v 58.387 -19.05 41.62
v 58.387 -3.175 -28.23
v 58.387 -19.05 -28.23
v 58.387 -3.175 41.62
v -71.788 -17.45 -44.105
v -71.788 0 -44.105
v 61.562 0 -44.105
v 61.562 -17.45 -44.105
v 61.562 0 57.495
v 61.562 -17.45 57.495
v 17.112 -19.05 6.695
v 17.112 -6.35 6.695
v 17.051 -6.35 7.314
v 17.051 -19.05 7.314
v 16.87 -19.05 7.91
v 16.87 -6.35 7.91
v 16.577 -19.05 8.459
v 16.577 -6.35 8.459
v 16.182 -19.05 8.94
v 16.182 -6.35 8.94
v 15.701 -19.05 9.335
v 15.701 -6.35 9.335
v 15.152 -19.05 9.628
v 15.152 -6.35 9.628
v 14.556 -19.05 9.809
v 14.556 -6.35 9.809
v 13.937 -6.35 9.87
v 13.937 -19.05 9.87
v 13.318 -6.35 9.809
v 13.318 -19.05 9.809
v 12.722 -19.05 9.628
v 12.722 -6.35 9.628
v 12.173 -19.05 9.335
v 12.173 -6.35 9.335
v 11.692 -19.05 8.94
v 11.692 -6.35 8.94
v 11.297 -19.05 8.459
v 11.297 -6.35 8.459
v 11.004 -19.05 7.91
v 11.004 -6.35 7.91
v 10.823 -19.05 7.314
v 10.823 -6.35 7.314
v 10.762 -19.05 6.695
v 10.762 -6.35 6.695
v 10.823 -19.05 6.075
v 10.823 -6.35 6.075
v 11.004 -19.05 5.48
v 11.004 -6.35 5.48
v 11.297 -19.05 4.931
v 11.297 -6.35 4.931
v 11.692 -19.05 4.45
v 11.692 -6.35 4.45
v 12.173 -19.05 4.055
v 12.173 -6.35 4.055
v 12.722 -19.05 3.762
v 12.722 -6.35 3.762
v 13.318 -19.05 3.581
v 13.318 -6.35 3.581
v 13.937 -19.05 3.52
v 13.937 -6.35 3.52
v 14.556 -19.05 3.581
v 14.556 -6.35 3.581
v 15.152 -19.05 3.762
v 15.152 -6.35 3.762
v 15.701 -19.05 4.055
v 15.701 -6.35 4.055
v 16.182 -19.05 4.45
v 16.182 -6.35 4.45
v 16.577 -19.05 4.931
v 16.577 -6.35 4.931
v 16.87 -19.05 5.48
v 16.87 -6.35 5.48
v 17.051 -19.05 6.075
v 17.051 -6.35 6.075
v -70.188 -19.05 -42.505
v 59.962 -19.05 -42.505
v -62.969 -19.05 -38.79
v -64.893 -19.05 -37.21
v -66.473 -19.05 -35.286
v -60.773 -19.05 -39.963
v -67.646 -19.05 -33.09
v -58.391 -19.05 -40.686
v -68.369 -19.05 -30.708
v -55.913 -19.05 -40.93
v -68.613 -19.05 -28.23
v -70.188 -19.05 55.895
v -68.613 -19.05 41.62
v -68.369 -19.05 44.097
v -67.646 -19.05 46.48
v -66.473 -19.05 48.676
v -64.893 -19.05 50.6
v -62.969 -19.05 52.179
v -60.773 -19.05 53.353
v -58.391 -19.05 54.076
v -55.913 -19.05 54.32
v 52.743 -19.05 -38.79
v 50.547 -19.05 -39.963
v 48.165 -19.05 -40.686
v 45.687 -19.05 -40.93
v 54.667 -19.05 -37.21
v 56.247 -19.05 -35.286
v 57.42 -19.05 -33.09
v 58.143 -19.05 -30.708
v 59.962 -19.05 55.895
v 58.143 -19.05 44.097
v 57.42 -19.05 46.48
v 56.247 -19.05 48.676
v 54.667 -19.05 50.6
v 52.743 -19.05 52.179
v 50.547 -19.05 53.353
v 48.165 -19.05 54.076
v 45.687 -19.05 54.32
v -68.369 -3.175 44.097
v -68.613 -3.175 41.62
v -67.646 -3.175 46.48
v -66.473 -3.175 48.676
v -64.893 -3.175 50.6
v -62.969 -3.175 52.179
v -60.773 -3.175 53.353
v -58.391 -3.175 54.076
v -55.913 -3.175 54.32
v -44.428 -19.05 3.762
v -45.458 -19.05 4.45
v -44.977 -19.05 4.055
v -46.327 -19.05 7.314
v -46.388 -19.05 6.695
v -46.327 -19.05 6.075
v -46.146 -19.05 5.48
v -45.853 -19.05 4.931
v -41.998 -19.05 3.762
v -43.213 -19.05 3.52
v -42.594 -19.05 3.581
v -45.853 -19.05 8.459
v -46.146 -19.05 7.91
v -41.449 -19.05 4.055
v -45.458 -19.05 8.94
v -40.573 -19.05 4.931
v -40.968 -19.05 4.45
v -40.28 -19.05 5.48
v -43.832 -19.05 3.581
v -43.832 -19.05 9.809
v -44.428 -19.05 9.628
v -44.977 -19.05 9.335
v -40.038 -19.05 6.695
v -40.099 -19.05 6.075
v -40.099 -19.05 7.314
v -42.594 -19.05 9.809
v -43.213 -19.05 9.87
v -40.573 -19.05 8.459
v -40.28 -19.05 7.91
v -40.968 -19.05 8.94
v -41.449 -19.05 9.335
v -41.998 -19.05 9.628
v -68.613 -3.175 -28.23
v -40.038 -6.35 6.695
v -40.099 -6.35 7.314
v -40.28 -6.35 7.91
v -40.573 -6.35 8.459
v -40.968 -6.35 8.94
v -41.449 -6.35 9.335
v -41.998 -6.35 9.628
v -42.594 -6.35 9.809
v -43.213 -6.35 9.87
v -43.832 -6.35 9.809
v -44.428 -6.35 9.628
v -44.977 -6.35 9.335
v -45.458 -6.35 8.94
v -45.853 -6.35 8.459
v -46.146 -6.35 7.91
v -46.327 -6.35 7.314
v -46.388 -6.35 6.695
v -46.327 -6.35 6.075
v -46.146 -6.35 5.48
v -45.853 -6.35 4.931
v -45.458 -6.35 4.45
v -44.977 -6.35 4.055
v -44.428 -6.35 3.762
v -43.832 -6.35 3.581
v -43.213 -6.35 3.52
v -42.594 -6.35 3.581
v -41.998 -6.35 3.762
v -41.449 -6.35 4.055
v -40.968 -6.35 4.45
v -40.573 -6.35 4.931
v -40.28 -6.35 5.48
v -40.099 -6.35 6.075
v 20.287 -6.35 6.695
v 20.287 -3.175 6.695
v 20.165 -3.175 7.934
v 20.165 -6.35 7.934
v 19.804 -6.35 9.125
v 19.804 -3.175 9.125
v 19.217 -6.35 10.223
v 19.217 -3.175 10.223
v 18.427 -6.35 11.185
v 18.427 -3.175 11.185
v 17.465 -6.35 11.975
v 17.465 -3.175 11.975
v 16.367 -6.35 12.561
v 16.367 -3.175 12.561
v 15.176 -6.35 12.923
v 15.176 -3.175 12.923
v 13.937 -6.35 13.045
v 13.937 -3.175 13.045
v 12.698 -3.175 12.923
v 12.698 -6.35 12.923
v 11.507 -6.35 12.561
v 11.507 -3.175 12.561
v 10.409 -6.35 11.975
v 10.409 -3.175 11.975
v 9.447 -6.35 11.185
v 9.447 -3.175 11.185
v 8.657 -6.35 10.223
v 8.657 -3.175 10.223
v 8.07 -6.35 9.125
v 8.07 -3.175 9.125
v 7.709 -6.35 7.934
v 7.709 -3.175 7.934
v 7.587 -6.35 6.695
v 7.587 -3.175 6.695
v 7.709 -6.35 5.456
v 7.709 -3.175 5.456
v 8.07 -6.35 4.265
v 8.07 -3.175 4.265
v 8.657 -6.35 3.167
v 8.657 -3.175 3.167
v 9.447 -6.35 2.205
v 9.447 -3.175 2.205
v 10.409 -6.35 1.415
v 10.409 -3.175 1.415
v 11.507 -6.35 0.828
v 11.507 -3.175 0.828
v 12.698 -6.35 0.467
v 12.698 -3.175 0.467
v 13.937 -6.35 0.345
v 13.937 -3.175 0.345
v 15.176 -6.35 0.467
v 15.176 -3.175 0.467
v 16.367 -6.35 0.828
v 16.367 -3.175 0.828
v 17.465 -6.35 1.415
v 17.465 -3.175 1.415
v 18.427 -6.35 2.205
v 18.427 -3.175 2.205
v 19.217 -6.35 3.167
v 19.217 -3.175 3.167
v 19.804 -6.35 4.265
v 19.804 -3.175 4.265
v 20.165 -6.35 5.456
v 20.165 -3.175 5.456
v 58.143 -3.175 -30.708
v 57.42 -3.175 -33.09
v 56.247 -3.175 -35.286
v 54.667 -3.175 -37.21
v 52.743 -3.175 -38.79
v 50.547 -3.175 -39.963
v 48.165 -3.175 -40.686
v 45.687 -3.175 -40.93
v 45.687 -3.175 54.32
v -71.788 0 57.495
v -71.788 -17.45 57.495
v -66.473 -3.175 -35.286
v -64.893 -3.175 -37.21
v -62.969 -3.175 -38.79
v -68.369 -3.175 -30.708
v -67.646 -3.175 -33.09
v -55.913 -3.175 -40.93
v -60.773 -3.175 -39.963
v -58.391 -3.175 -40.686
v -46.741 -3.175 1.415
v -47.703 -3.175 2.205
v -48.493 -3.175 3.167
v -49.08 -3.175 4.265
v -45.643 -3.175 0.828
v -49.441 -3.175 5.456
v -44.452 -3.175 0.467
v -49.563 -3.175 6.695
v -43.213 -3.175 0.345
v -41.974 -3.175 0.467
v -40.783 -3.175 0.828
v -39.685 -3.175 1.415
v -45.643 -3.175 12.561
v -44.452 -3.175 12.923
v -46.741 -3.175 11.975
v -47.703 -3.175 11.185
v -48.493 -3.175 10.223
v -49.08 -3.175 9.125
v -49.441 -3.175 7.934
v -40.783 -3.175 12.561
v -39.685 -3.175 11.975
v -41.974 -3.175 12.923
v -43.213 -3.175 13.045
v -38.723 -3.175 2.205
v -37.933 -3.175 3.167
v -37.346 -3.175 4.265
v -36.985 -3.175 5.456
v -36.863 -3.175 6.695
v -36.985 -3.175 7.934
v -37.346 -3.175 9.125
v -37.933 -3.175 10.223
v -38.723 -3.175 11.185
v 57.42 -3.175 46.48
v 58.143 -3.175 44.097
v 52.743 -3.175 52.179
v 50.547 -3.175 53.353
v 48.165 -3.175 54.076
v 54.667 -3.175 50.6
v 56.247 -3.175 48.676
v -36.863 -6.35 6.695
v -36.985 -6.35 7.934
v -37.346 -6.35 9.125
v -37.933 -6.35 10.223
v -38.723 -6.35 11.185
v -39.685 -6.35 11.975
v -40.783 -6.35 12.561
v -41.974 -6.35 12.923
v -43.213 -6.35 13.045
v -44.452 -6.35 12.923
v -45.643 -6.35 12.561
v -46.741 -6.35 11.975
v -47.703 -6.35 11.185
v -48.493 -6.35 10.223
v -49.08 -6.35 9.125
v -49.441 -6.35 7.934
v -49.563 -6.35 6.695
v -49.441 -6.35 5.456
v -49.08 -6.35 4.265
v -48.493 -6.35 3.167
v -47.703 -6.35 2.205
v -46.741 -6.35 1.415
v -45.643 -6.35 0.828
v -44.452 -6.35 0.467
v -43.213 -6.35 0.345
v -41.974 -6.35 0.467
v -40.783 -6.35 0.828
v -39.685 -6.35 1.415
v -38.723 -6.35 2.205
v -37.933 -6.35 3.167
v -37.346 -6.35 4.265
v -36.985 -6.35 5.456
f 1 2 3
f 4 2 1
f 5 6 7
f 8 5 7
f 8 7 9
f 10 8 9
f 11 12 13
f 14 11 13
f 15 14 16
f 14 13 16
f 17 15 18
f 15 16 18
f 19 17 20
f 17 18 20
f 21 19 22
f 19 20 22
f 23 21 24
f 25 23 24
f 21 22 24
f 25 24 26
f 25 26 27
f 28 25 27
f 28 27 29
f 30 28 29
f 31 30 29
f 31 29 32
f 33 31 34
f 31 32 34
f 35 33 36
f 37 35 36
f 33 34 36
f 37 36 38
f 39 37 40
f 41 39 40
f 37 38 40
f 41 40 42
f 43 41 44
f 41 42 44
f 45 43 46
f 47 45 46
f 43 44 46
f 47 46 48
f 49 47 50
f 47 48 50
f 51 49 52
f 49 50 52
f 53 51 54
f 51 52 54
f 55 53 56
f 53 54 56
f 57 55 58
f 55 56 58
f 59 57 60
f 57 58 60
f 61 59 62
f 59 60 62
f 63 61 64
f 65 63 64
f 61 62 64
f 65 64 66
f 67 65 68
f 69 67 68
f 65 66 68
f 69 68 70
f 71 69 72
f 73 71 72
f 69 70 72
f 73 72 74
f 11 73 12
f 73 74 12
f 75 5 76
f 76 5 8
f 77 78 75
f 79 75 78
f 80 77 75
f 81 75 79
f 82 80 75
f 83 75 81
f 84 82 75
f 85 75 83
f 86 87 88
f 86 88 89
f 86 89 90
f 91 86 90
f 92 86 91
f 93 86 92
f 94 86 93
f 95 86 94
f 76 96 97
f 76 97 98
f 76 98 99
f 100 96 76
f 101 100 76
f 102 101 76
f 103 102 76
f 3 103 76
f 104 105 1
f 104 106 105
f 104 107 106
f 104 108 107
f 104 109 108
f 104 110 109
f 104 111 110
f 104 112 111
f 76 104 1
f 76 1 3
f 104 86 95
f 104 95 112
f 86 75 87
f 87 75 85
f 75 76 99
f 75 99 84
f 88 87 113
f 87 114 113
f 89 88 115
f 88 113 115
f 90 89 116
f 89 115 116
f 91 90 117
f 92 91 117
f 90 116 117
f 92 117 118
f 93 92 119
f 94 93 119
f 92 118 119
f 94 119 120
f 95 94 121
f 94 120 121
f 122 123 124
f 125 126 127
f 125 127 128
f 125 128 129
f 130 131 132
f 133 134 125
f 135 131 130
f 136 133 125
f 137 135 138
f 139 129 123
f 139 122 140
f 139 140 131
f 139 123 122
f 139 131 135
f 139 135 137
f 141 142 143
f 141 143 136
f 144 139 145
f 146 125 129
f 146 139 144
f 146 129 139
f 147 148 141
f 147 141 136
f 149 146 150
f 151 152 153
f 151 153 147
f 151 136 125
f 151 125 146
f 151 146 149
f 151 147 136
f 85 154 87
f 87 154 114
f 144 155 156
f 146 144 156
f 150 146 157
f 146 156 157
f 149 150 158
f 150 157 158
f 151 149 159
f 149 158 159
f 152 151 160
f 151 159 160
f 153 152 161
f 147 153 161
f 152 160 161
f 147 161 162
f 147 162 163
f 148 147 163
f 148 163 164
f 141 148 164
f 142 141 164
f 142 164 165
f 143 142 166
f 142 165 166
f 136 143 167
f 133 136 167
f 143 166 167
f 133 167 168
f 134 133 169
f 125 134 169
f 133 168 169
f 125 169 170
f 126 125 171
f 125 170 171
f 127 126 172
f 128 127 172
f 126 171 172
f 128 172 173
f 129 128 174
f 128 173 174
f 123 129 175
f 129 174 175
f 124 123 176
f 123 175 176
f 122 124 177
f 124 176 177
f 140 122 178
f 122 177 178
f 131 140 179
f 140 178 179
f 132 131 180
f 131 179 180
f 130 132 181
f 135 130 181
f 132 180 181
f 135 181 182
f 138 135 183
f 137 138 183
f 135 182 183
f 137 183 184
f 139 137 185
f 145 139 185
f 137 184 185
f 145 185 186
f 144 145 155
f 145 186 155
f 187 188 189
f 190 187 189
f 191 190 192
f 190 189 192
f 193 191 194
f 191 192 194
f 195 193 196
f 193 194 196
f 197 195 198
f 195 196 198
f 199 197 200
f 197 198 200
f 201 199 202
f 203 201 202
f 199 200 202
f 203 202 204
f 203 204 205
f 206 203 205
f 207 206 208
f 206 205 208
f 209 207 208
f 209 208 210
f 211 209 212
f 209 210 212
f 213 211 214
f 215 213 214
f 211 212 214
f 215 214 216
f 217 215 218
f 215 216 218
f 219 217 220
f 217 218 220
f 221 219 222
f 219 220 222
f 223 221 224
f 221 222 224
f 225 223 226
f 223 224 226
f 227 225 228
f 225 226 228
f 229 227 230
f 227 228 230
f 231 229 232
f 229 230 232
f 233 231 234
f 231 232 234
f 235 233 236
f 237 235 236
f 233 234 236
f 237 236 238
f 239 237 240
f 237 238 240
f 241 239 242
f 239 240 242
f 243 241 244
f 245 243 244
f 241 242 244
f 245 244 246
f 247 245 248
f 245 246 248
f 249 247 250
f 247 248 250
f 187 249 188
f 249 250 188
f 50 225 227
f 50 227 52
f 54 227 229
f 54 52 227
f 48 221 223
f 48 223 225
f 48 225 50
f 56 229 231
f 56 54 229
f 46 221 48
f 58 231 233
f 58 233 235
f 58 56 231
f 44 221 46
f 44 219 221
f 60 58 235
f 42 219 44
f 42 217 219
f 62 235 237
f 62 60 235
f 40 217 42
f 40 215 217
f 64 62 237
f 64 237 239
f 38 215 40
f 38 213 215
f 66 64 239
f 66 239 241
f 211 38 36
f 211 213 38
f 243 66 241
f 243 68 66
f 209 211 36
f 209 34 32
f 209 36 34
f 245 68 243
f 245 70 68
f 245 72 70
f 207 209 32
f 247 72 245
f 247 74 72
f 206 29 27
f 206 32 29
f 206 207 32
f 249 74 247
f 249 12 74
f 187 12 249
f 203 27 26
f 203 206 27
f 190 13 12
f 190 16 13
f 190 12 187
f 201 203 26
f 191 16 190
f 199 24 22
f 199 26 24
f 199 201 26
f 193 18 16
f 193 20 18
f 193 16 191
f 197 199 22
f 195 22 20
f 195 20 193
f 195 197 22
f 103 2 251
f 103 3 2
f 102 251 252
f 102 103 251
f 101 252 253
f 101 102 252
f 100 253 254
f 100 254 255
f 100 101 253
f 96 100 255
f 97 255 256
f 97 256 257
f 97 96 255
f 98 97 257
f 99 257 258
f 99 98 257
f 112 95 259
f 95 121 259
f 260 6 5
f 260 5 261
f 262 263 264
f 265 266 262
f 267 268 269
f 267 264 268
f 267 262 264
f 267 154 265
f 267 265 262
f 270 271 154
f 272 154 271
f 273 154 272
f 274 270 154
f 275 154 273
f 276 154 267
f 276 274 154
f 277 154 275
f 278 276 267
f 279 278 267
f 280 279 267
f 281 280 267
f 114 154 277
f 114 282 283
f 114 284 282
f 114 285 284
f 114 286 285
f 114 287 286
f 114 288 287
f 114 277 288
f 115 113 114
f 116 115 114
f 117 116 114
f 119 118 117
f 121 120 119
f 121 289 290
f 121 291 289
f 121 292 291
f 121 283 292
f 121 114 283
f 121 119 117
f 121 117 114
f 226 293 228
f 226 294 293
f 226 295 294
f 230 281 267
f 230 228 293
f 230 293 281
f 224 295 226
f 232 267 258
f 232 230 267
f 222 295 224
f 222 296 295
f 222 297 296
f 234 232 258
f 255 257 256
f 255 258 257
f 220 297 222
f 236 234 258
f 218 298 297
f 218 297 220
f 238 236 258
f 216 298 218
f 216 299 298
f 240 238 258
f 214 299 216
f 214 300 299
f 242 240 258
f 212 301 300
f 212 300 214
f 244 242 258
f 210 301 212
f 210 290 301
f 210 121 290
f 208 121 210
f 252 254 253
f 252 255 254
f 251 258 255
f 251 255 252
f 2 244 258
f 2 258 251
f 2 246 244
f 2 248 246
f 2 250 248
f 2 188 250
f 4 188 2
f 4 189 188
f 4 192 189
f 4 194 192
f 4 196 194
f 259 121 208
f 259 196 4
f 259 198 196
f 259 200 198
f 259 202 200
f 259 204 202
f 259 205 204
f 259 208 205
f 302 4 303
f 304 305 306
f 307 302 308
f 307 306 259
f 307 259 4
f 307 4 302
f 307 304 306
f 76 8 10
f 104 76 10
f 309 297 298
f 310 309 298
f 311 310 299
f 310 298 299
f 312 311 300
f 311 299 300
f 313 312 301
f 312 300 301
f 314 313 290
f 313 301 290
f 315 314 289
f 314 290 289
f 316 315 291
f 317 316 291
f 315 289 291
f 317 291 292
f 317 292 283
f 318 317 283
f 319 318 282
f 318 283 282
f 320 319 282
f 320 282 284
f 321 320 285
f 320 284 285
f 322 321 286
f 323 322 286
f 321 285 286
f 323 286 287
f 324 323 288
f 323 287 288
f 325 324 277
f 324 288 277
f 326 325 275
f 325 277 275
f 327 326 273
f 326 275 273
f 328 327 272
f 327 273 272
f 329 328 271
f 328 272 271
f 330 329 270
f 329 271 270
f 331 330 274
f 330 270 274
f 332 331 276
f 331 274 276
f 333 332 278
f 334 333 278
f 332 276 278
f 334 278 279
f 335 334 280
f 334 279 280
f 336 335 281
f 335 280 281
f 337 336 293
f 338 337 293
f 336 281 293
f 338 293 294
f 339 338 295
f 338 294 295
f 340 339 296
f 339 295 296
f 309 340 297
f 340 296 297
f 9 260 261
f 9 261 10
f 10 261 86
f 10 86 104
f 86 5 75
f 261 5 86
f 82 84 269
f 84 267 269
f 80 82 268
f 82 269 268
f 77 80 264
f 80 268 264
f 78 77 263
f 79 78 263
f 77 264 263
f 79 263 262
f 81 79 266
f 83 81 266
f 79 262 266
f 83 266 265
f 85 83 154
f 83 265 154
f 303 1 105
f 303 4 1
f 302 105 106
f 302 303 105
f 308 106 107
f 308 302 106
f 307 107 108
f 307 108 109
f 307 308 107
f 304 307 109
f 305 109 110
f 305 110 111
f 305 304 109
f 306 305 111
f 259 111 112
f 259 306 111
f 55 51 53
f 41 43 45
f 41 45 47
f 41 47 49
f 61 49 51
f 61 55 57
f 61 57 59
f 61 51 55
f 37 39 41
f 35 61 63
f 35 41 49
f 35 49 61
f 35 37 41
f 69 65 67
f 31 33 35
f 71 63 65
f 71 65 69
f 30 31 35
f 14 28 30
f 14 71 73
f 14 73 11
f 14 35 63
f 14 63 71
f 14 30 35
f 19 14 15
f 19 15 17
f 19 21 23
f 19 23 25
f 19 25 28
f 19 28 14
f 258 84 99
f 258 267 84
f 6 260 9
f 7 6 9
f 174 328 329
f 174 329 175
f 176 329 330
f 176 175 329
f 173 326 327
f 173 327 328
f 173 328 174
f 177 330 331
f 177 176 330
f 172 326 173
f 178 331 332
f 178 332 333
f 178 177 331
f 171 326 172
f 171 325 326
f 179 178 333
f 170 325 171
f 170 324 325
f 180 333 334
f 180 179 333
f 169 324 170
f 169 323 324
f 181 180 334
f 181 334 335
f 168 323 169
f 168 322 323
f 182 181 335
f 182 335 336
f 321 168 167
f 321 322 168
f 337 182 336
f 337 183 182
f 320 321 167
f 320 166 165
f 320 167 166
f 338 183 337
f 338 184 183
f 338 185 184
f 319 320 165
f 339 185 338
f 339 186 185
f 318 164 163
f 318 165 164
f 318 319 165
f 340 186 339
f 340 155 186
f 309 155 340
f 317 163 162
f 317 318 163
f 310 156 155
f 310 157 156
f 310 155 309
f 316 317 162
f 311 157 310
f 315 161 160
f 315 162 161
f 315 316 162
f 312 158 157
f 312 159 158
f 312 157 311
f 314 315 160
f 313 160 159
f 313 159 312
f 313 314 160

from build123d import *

# Parameters (mm, degrees)
F0_W     = 133.35
F0_H     = 101.6
F1_DEPTH = 19.05
F2_T     = -3.175
F3_R     = 6.35
F4_DEPTH = 3.175
F5_R     = 3.175
F6_DEPTH = 12.7
F7_R     = 3.175
F8_DEPTH = 12.7
F9_R     = 12.7
F10_SIZE = 1.6002


with BuildPart() as f1:
    # F0 (on Front) → F1 (new body)
    with BuildSketch(Plane.XZ):
        with Locations((-5.1130652428, 6.6948301531)):
            Rectangle(F0_W, F0_H)
    extrude(amount=F1_DEPTH)

    # F2
    f2_openings = [f1.faces().sort_by_distance(p)[0] for p in [
        (-5.113065, -19.05, 6.69483),
    ]]
    offset(amount=F2_T, openings=f2_openings)

    # F3 (on face) → F4 (join)
    with BuildSketch(Plane.XZ.offset(3.175)):
        with Locations((-43.2130652428, 6.6948301531)):
            Circle(F3_R)
        with Locations((13.9369347572, 6.6948301531)):
            Circle(F3_R)
    extrude(amount=F4_DEPTH)

    # F5 (on face) → F6 (join)
    with BuildSketch(Plane.XZ.offset(6.35)):
        with Locations((-43.2130652428, 6.6948301531)):
            Circle(F5_R)
    extrude(amount=F6_DEPTH)

    # F7 (on face) → F8 (join)
    with BuildSketch(Plane.XZ.offset(6.35)):
        with Locations((13.9369347572, 6.6948301531)):
            Circle(F7_R)
    extrude(amount=F8_DEPTH)

    # F9
    f9_edges = [f1.edges().sort_by_distance(p)[0] for p in [
        (-68.613065, -11.1125, -40.93017),
        (58.386935, -11.1125, -40.93017),
        (-68.613065, -11.1125, 54.31983),
        (58.386935, -11.1125, 54.31983),
    ]]
    fillet(f9_edges, radius=F9_R)

    # F10
    f10_edges = [f1.edges().sort_by_distance(p)[0] for p in [
        (61.561935, -19.05, 6.69483),
        (-5.113065, -19.05, -44.10517),
        (-71.788065, -19.05, 6.69483),
        (-5.113065, -19.05, 57.49483),
    ]]
    chamfer(f10_edges, length=F10_SIZE)


solid = f1.part
